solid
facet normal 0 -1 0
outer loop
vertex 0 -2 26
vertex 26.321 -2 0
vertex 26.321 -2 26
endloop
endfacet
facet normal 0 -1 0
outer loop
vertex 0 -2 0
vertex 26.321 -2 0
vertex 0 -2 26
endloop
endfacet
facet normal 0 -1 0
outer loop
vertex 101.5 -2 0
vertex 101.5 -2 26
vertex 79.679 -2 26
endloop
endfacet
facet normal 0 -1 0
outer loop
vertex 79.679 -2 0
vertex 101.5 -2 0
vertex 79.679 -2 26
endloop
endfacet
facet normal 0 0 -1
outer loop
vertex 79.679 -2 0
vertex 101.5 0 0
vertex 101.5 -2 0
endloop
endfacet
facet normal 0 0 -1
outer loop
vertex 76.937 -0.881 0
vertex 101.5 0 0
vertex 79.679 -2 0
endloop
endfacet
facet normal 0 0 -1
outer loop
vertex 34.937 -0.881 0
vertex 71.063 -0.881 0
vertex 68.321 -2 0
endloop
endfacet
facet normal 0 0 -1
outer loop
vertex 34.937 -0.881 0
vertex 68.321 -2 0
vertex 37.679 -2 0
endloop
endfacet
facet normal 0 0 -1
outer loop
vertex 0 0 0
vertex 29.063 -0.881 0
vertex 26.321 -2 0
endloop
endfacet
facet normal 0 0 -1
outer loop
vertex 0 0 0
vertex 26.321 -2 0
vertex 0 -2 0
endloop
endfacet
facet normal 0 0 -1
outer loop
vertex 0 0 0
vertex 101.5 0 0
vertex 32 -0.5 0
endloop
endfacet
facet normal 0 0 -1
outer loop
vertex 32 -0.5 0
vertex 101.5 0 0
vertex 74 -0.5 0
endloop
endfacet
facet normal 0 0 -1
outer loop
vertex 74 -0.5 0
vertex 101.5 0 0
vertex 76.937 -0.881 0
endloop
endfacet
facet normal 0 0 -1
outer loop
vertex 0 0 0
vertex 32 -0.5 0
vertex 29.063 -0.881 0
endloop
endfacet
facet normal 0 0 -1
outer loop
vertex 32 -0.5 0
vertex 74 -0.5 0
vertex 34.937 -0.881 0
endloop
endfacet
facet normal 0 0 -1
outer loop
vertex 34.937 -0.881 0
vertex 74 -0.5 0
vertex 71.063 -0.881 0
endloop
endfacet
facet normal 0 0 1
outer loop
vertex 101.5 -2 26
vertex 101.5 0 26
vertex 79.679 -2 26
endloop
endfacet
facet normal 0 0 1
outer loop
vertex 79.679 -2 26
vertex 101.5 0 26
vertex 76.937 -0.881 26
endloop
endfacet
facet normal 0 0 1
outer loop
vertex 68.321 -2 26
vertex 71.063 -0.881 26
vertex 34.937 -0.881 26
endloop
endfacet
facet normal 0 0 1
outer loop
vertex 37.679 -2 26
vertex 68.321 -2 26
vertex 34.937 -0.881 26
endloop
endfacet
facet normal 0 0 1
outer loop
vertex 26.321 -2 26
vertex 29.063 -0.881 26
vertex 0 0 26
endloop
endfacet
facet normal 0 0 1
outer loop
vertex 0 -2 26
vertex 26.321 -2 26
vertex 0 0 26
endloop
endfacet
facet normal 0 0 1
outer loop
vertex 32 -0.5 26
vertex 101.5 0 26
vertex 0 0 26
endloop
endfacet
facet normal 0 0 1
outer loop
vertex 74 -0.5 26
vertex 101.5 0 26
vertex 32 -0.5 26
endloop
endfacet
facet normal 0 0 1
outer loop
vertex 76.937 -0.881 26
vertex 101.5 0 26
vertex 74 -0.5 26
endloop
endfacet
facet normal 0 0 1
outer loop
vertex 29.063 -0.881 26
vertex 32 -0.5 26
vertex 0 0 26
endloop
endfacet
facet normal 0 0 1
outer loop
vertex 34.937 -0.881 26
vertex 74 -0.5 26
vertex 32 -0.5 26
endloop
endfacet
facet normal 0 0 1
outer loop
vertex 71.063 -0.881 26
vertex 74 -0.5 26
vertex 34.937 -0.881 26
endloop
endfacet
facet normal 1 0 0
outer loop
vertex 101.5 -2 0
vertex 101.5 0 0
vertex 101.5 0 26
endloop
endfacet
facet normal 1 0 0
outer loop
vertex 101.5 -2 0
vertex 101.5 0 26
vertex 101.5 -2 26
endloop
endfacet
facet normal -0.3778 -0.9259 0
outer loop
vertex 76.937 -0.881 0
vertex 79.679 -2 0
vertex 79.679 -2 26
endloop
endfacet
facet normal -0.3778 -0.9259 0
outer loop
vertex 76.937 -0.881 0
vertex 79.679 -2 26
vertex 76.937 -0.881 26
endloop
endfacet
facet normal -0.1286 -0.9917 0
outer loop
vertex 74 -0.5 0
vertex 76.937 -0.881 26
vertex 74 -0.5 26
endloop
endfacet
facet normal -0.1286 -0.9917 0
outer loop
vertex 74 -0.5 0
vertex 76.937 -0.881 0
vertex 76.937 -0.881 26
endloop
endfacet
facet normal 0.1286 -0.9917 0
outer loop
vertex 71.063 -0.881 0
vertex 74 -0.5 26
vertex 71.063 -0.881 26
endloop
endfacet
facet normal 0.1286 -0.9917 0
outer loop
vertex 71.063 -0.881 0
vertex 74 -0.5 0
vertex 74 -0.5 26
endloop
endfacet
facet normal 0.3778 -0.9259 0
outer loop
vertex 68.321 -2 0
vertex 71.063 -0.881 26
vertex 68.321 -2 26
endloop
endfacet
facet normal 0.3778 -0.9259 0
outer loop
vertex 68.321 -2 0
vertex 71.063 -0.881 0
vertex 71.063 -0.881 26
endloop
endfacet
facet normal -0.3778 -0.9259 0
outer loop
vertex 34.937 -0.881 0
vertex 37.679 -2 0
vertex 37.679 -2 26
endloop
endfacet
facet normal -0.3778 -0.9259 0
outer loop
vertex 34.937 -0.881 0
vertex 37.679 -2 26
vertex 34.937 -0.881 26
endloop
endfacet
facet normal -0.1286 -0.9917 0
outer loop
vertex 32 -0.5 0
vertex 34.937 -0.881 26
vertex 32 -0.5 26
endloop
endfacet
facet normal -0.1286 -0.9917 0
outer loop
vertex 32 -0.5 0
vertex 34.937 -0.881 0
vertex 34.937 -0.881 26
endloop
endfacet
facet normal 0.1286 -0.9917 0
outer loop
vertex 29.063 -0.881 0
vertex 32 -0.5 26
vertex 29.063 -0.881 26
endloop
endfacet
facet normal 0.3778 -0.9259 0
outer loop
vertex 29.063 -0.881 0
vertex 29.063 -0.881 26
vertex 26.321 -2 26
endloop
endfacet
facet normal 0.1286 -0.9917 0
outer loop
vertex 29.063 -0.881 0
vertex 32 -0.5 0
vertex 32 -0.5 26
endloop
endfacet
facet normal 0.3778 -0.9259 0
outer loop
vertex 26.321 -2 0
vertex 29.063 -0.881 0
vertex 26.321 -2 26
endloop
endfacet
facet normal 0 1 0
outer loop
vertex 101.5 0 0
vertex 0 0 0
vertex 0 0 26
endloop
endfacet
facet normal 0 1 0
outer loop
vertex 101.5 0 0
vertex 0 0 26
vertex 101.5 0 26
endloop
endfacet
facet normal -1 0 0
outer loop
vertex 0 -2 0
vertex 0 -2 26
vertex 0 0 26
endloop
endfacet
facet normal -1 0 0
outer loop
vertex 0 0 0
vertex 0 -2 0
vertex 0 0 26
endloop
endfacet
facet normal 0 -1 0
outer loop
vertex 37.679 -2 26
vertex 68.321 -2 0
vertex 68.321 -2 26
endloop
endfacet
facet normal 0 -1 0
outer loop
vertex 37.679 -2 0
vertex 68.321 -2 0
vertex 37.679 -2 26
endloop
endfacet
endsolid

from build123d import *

# Parameters (mm, degrees)
BOSS_EXTRUDE1_DEPTH = 26


with BuildPart() as part:
    # Sketch1 → Boss-Extrude1 (new body)
    with BuildSketch(Plane.XY):
        with BuildLine():
            Line((0, 0), (101.5, 0))
            Line((101.5, 0), (101.5, -2))
            Line((101.5, -2), (79.678908346, -2))
            ThreePointArc((79.678908346, -2), (74, -0.5), (68.321091654, -2))
            Line((68.321091654, -2), (37.678908346, -2))
            ThreePointArc((37.678908346, -2), (32, -0.5), (26.321091654, -2))
            Line((26.321091654, -2), (0, -2))
            Line((0, -2), (0, 0))
        make_face()
    extrude(amount=BOSS_EXTRUDE1_DEPTH)


solid = part.part
